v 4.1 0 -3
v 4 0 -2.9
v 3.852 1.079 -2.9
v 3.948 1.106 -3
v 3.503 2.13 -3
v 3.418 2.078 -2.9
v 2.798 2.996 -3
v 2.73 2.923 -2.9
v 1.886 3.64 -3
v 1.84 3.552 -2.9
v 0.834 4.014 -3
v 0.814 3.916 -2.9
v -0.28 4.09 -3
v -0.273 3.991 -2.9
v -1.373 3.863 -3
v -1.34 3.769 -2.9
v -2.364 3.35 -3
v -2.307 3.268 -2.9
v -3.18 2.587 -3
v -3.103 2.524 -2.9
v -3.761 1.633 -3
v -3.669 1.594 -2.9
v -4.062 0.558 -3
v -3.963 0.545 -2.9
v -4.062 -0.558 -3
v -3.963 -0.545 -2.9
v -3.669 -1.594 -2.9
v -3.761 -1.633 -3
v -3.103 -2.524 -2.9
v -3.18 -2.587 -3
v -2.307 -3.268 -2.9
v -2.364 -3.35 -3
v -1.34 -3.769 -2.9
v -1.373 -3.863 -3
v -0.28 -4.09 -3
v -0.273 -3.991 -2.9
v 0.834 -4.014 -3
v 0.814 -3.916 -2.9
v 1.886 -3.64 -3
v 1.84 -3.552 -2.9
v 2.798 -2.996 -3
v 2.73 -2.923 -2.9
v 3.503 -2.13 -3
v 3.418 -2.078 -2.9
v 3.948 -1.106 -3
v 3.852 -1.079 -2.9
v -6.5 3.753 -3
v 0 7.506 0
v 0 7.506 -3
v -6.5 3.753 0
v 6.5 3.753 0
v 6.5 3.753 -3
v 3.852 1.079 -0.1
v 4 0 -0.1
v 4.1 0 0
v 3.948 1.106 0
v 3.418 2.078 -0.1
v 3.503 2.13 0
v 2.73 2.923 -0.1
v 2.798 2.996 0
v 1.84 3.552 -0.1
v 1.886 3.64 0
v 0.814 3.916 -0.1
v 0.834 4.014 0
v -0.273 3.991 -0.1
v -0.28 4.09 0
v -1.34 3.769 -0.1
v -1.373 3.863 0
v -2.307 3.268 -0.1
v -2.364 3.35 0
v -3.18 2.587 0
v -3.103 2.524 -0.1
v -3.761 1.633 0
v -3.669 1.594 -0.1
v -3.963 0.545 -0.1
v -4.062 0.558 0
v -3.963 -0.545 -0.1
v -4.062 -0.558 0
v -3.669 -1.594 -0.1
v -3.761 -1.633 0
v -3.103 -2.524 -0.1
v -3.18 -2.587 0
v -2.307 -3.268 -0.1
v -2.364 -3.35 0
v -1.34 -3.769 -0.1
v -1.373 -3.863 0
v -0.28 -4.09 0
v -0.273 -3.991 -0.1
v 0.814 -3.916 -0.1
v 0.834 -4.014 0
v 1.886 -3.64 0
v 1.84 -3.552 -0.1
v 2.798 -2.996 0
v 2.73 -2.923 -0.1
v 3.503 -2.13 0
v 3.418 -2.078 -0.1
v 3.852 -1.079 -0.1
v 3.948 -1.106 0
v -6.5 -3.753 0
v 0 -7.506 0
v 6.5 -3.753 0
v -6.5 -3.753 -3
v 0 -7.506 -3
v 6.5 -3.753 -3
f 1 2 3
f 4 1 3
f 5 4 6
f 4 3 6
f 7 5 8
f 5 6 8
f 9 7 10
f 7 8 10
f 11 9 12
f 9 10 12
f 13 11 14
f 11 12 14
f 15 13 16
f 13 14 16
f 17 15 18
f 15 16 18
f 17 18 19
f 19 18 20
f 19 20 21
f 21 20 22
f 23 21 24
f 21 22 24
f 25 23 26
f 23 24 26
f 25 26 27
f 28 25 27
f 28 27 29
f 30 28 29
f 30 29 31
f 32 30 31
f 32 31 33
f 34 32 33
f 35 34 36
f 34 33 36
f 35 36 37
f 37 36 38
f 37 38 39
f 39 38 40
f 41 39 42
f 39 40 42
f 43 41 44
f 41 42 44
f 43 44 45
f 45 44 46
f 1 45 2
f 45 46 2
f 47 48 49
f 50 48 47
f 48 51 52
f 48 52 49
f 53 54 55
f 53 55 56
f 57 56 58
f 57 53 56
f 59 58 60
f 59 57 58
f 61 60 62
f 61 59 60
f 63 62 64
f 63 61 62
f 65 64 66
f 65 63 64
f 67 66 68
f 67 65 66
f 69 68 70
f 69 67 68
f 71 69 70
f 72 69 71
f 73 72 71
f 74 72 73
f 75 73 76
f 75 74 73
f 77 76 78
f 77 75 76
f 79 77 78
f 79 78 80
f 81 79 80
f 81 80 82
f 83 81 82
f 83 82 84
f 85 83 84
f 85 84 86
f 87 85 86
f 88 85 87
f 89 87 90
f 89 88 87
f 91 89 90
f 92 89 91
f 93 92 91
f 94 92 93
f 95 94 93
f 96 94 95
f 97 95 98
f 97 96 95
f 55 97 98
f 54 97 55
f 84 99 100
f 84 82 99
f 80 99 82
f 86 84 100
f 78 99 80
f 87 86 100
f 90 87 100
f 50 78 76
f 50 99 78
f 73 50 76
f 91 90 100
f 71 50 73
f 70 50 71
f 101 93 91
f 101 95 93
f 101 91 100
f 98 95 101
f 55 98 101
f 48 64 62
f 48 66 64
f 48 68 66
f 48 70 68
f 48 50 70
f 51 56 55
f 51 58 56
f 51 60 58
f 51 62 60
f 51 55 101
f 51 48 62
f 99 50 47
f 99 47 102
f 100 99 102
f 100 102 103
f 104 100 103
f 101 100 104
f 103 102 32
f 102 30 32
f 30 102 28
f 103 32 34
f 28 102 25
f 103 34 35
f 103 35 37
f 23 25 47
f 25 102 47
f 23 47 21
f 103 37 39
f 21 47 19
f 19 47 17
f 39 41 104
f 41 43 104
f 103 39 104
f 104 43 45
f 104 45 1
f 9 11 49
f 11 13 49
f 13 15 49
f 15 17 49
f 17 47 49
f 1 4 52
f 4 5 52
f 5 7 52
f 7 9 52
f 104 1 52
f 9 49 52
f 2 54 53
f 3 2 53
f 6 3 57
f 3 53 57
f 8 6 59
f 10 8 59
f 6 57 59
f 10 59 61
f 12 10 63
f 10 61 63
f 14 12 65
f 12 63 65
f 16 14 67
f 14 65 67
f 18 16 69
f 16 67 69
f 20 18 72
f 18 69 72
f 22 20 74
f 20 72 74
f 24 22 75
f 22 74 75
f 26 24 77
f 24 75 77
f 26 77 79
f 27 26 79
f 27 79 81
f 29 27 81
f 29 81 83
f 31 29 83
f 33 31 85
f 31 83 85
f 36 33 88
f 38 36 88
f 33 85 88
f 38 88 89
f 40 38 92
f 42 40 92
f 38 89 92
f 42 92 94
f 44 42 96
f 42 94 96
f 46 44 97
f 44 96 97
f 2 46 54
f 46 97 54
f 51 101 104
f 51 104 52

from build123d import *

# Parameters (mm, degrees)
EXTRUDE_1_DEPTH     = 3
SKETCH_2_R          = 4
CUT_EXTRUDE_1_DEPTH = 3
CHAMFER_1_SIZE      = 0.1


with BuildPart() as part:
    # 草图1 → 凸台-拉伸1 (new body)
    with BuildSketch(Plane.XY):
        Polygon((0, 7.505553499), (-6.5, 3.75277675), (-6.5, -3.75277675), (0, -7.505553499), (6.5, -3.75277675), (6.5, 3.75277675), align=None)
    extrude(amount=-EXTRUDE_1_DEPTH)

    # 草图2 → 切除-拉伸1 (cut)
    with BuildSketch(Plane.XY):
        Circle(SKETCH_2_R)
    extrude(amount=-CUT_EXTRUDE_1_DEPTH, mode=Mode.SUBTRACT)

    # 倒角1
    chamfer_1_edges = [part.edges().sort_by_distance(p)[0] for p in [
        (-4, 0, -3),
        (-4, 0, 0),
    ]]
    chamfer(chamfer_1_edges, length=CHAMFER_1_SIZE)


solid = part.part
